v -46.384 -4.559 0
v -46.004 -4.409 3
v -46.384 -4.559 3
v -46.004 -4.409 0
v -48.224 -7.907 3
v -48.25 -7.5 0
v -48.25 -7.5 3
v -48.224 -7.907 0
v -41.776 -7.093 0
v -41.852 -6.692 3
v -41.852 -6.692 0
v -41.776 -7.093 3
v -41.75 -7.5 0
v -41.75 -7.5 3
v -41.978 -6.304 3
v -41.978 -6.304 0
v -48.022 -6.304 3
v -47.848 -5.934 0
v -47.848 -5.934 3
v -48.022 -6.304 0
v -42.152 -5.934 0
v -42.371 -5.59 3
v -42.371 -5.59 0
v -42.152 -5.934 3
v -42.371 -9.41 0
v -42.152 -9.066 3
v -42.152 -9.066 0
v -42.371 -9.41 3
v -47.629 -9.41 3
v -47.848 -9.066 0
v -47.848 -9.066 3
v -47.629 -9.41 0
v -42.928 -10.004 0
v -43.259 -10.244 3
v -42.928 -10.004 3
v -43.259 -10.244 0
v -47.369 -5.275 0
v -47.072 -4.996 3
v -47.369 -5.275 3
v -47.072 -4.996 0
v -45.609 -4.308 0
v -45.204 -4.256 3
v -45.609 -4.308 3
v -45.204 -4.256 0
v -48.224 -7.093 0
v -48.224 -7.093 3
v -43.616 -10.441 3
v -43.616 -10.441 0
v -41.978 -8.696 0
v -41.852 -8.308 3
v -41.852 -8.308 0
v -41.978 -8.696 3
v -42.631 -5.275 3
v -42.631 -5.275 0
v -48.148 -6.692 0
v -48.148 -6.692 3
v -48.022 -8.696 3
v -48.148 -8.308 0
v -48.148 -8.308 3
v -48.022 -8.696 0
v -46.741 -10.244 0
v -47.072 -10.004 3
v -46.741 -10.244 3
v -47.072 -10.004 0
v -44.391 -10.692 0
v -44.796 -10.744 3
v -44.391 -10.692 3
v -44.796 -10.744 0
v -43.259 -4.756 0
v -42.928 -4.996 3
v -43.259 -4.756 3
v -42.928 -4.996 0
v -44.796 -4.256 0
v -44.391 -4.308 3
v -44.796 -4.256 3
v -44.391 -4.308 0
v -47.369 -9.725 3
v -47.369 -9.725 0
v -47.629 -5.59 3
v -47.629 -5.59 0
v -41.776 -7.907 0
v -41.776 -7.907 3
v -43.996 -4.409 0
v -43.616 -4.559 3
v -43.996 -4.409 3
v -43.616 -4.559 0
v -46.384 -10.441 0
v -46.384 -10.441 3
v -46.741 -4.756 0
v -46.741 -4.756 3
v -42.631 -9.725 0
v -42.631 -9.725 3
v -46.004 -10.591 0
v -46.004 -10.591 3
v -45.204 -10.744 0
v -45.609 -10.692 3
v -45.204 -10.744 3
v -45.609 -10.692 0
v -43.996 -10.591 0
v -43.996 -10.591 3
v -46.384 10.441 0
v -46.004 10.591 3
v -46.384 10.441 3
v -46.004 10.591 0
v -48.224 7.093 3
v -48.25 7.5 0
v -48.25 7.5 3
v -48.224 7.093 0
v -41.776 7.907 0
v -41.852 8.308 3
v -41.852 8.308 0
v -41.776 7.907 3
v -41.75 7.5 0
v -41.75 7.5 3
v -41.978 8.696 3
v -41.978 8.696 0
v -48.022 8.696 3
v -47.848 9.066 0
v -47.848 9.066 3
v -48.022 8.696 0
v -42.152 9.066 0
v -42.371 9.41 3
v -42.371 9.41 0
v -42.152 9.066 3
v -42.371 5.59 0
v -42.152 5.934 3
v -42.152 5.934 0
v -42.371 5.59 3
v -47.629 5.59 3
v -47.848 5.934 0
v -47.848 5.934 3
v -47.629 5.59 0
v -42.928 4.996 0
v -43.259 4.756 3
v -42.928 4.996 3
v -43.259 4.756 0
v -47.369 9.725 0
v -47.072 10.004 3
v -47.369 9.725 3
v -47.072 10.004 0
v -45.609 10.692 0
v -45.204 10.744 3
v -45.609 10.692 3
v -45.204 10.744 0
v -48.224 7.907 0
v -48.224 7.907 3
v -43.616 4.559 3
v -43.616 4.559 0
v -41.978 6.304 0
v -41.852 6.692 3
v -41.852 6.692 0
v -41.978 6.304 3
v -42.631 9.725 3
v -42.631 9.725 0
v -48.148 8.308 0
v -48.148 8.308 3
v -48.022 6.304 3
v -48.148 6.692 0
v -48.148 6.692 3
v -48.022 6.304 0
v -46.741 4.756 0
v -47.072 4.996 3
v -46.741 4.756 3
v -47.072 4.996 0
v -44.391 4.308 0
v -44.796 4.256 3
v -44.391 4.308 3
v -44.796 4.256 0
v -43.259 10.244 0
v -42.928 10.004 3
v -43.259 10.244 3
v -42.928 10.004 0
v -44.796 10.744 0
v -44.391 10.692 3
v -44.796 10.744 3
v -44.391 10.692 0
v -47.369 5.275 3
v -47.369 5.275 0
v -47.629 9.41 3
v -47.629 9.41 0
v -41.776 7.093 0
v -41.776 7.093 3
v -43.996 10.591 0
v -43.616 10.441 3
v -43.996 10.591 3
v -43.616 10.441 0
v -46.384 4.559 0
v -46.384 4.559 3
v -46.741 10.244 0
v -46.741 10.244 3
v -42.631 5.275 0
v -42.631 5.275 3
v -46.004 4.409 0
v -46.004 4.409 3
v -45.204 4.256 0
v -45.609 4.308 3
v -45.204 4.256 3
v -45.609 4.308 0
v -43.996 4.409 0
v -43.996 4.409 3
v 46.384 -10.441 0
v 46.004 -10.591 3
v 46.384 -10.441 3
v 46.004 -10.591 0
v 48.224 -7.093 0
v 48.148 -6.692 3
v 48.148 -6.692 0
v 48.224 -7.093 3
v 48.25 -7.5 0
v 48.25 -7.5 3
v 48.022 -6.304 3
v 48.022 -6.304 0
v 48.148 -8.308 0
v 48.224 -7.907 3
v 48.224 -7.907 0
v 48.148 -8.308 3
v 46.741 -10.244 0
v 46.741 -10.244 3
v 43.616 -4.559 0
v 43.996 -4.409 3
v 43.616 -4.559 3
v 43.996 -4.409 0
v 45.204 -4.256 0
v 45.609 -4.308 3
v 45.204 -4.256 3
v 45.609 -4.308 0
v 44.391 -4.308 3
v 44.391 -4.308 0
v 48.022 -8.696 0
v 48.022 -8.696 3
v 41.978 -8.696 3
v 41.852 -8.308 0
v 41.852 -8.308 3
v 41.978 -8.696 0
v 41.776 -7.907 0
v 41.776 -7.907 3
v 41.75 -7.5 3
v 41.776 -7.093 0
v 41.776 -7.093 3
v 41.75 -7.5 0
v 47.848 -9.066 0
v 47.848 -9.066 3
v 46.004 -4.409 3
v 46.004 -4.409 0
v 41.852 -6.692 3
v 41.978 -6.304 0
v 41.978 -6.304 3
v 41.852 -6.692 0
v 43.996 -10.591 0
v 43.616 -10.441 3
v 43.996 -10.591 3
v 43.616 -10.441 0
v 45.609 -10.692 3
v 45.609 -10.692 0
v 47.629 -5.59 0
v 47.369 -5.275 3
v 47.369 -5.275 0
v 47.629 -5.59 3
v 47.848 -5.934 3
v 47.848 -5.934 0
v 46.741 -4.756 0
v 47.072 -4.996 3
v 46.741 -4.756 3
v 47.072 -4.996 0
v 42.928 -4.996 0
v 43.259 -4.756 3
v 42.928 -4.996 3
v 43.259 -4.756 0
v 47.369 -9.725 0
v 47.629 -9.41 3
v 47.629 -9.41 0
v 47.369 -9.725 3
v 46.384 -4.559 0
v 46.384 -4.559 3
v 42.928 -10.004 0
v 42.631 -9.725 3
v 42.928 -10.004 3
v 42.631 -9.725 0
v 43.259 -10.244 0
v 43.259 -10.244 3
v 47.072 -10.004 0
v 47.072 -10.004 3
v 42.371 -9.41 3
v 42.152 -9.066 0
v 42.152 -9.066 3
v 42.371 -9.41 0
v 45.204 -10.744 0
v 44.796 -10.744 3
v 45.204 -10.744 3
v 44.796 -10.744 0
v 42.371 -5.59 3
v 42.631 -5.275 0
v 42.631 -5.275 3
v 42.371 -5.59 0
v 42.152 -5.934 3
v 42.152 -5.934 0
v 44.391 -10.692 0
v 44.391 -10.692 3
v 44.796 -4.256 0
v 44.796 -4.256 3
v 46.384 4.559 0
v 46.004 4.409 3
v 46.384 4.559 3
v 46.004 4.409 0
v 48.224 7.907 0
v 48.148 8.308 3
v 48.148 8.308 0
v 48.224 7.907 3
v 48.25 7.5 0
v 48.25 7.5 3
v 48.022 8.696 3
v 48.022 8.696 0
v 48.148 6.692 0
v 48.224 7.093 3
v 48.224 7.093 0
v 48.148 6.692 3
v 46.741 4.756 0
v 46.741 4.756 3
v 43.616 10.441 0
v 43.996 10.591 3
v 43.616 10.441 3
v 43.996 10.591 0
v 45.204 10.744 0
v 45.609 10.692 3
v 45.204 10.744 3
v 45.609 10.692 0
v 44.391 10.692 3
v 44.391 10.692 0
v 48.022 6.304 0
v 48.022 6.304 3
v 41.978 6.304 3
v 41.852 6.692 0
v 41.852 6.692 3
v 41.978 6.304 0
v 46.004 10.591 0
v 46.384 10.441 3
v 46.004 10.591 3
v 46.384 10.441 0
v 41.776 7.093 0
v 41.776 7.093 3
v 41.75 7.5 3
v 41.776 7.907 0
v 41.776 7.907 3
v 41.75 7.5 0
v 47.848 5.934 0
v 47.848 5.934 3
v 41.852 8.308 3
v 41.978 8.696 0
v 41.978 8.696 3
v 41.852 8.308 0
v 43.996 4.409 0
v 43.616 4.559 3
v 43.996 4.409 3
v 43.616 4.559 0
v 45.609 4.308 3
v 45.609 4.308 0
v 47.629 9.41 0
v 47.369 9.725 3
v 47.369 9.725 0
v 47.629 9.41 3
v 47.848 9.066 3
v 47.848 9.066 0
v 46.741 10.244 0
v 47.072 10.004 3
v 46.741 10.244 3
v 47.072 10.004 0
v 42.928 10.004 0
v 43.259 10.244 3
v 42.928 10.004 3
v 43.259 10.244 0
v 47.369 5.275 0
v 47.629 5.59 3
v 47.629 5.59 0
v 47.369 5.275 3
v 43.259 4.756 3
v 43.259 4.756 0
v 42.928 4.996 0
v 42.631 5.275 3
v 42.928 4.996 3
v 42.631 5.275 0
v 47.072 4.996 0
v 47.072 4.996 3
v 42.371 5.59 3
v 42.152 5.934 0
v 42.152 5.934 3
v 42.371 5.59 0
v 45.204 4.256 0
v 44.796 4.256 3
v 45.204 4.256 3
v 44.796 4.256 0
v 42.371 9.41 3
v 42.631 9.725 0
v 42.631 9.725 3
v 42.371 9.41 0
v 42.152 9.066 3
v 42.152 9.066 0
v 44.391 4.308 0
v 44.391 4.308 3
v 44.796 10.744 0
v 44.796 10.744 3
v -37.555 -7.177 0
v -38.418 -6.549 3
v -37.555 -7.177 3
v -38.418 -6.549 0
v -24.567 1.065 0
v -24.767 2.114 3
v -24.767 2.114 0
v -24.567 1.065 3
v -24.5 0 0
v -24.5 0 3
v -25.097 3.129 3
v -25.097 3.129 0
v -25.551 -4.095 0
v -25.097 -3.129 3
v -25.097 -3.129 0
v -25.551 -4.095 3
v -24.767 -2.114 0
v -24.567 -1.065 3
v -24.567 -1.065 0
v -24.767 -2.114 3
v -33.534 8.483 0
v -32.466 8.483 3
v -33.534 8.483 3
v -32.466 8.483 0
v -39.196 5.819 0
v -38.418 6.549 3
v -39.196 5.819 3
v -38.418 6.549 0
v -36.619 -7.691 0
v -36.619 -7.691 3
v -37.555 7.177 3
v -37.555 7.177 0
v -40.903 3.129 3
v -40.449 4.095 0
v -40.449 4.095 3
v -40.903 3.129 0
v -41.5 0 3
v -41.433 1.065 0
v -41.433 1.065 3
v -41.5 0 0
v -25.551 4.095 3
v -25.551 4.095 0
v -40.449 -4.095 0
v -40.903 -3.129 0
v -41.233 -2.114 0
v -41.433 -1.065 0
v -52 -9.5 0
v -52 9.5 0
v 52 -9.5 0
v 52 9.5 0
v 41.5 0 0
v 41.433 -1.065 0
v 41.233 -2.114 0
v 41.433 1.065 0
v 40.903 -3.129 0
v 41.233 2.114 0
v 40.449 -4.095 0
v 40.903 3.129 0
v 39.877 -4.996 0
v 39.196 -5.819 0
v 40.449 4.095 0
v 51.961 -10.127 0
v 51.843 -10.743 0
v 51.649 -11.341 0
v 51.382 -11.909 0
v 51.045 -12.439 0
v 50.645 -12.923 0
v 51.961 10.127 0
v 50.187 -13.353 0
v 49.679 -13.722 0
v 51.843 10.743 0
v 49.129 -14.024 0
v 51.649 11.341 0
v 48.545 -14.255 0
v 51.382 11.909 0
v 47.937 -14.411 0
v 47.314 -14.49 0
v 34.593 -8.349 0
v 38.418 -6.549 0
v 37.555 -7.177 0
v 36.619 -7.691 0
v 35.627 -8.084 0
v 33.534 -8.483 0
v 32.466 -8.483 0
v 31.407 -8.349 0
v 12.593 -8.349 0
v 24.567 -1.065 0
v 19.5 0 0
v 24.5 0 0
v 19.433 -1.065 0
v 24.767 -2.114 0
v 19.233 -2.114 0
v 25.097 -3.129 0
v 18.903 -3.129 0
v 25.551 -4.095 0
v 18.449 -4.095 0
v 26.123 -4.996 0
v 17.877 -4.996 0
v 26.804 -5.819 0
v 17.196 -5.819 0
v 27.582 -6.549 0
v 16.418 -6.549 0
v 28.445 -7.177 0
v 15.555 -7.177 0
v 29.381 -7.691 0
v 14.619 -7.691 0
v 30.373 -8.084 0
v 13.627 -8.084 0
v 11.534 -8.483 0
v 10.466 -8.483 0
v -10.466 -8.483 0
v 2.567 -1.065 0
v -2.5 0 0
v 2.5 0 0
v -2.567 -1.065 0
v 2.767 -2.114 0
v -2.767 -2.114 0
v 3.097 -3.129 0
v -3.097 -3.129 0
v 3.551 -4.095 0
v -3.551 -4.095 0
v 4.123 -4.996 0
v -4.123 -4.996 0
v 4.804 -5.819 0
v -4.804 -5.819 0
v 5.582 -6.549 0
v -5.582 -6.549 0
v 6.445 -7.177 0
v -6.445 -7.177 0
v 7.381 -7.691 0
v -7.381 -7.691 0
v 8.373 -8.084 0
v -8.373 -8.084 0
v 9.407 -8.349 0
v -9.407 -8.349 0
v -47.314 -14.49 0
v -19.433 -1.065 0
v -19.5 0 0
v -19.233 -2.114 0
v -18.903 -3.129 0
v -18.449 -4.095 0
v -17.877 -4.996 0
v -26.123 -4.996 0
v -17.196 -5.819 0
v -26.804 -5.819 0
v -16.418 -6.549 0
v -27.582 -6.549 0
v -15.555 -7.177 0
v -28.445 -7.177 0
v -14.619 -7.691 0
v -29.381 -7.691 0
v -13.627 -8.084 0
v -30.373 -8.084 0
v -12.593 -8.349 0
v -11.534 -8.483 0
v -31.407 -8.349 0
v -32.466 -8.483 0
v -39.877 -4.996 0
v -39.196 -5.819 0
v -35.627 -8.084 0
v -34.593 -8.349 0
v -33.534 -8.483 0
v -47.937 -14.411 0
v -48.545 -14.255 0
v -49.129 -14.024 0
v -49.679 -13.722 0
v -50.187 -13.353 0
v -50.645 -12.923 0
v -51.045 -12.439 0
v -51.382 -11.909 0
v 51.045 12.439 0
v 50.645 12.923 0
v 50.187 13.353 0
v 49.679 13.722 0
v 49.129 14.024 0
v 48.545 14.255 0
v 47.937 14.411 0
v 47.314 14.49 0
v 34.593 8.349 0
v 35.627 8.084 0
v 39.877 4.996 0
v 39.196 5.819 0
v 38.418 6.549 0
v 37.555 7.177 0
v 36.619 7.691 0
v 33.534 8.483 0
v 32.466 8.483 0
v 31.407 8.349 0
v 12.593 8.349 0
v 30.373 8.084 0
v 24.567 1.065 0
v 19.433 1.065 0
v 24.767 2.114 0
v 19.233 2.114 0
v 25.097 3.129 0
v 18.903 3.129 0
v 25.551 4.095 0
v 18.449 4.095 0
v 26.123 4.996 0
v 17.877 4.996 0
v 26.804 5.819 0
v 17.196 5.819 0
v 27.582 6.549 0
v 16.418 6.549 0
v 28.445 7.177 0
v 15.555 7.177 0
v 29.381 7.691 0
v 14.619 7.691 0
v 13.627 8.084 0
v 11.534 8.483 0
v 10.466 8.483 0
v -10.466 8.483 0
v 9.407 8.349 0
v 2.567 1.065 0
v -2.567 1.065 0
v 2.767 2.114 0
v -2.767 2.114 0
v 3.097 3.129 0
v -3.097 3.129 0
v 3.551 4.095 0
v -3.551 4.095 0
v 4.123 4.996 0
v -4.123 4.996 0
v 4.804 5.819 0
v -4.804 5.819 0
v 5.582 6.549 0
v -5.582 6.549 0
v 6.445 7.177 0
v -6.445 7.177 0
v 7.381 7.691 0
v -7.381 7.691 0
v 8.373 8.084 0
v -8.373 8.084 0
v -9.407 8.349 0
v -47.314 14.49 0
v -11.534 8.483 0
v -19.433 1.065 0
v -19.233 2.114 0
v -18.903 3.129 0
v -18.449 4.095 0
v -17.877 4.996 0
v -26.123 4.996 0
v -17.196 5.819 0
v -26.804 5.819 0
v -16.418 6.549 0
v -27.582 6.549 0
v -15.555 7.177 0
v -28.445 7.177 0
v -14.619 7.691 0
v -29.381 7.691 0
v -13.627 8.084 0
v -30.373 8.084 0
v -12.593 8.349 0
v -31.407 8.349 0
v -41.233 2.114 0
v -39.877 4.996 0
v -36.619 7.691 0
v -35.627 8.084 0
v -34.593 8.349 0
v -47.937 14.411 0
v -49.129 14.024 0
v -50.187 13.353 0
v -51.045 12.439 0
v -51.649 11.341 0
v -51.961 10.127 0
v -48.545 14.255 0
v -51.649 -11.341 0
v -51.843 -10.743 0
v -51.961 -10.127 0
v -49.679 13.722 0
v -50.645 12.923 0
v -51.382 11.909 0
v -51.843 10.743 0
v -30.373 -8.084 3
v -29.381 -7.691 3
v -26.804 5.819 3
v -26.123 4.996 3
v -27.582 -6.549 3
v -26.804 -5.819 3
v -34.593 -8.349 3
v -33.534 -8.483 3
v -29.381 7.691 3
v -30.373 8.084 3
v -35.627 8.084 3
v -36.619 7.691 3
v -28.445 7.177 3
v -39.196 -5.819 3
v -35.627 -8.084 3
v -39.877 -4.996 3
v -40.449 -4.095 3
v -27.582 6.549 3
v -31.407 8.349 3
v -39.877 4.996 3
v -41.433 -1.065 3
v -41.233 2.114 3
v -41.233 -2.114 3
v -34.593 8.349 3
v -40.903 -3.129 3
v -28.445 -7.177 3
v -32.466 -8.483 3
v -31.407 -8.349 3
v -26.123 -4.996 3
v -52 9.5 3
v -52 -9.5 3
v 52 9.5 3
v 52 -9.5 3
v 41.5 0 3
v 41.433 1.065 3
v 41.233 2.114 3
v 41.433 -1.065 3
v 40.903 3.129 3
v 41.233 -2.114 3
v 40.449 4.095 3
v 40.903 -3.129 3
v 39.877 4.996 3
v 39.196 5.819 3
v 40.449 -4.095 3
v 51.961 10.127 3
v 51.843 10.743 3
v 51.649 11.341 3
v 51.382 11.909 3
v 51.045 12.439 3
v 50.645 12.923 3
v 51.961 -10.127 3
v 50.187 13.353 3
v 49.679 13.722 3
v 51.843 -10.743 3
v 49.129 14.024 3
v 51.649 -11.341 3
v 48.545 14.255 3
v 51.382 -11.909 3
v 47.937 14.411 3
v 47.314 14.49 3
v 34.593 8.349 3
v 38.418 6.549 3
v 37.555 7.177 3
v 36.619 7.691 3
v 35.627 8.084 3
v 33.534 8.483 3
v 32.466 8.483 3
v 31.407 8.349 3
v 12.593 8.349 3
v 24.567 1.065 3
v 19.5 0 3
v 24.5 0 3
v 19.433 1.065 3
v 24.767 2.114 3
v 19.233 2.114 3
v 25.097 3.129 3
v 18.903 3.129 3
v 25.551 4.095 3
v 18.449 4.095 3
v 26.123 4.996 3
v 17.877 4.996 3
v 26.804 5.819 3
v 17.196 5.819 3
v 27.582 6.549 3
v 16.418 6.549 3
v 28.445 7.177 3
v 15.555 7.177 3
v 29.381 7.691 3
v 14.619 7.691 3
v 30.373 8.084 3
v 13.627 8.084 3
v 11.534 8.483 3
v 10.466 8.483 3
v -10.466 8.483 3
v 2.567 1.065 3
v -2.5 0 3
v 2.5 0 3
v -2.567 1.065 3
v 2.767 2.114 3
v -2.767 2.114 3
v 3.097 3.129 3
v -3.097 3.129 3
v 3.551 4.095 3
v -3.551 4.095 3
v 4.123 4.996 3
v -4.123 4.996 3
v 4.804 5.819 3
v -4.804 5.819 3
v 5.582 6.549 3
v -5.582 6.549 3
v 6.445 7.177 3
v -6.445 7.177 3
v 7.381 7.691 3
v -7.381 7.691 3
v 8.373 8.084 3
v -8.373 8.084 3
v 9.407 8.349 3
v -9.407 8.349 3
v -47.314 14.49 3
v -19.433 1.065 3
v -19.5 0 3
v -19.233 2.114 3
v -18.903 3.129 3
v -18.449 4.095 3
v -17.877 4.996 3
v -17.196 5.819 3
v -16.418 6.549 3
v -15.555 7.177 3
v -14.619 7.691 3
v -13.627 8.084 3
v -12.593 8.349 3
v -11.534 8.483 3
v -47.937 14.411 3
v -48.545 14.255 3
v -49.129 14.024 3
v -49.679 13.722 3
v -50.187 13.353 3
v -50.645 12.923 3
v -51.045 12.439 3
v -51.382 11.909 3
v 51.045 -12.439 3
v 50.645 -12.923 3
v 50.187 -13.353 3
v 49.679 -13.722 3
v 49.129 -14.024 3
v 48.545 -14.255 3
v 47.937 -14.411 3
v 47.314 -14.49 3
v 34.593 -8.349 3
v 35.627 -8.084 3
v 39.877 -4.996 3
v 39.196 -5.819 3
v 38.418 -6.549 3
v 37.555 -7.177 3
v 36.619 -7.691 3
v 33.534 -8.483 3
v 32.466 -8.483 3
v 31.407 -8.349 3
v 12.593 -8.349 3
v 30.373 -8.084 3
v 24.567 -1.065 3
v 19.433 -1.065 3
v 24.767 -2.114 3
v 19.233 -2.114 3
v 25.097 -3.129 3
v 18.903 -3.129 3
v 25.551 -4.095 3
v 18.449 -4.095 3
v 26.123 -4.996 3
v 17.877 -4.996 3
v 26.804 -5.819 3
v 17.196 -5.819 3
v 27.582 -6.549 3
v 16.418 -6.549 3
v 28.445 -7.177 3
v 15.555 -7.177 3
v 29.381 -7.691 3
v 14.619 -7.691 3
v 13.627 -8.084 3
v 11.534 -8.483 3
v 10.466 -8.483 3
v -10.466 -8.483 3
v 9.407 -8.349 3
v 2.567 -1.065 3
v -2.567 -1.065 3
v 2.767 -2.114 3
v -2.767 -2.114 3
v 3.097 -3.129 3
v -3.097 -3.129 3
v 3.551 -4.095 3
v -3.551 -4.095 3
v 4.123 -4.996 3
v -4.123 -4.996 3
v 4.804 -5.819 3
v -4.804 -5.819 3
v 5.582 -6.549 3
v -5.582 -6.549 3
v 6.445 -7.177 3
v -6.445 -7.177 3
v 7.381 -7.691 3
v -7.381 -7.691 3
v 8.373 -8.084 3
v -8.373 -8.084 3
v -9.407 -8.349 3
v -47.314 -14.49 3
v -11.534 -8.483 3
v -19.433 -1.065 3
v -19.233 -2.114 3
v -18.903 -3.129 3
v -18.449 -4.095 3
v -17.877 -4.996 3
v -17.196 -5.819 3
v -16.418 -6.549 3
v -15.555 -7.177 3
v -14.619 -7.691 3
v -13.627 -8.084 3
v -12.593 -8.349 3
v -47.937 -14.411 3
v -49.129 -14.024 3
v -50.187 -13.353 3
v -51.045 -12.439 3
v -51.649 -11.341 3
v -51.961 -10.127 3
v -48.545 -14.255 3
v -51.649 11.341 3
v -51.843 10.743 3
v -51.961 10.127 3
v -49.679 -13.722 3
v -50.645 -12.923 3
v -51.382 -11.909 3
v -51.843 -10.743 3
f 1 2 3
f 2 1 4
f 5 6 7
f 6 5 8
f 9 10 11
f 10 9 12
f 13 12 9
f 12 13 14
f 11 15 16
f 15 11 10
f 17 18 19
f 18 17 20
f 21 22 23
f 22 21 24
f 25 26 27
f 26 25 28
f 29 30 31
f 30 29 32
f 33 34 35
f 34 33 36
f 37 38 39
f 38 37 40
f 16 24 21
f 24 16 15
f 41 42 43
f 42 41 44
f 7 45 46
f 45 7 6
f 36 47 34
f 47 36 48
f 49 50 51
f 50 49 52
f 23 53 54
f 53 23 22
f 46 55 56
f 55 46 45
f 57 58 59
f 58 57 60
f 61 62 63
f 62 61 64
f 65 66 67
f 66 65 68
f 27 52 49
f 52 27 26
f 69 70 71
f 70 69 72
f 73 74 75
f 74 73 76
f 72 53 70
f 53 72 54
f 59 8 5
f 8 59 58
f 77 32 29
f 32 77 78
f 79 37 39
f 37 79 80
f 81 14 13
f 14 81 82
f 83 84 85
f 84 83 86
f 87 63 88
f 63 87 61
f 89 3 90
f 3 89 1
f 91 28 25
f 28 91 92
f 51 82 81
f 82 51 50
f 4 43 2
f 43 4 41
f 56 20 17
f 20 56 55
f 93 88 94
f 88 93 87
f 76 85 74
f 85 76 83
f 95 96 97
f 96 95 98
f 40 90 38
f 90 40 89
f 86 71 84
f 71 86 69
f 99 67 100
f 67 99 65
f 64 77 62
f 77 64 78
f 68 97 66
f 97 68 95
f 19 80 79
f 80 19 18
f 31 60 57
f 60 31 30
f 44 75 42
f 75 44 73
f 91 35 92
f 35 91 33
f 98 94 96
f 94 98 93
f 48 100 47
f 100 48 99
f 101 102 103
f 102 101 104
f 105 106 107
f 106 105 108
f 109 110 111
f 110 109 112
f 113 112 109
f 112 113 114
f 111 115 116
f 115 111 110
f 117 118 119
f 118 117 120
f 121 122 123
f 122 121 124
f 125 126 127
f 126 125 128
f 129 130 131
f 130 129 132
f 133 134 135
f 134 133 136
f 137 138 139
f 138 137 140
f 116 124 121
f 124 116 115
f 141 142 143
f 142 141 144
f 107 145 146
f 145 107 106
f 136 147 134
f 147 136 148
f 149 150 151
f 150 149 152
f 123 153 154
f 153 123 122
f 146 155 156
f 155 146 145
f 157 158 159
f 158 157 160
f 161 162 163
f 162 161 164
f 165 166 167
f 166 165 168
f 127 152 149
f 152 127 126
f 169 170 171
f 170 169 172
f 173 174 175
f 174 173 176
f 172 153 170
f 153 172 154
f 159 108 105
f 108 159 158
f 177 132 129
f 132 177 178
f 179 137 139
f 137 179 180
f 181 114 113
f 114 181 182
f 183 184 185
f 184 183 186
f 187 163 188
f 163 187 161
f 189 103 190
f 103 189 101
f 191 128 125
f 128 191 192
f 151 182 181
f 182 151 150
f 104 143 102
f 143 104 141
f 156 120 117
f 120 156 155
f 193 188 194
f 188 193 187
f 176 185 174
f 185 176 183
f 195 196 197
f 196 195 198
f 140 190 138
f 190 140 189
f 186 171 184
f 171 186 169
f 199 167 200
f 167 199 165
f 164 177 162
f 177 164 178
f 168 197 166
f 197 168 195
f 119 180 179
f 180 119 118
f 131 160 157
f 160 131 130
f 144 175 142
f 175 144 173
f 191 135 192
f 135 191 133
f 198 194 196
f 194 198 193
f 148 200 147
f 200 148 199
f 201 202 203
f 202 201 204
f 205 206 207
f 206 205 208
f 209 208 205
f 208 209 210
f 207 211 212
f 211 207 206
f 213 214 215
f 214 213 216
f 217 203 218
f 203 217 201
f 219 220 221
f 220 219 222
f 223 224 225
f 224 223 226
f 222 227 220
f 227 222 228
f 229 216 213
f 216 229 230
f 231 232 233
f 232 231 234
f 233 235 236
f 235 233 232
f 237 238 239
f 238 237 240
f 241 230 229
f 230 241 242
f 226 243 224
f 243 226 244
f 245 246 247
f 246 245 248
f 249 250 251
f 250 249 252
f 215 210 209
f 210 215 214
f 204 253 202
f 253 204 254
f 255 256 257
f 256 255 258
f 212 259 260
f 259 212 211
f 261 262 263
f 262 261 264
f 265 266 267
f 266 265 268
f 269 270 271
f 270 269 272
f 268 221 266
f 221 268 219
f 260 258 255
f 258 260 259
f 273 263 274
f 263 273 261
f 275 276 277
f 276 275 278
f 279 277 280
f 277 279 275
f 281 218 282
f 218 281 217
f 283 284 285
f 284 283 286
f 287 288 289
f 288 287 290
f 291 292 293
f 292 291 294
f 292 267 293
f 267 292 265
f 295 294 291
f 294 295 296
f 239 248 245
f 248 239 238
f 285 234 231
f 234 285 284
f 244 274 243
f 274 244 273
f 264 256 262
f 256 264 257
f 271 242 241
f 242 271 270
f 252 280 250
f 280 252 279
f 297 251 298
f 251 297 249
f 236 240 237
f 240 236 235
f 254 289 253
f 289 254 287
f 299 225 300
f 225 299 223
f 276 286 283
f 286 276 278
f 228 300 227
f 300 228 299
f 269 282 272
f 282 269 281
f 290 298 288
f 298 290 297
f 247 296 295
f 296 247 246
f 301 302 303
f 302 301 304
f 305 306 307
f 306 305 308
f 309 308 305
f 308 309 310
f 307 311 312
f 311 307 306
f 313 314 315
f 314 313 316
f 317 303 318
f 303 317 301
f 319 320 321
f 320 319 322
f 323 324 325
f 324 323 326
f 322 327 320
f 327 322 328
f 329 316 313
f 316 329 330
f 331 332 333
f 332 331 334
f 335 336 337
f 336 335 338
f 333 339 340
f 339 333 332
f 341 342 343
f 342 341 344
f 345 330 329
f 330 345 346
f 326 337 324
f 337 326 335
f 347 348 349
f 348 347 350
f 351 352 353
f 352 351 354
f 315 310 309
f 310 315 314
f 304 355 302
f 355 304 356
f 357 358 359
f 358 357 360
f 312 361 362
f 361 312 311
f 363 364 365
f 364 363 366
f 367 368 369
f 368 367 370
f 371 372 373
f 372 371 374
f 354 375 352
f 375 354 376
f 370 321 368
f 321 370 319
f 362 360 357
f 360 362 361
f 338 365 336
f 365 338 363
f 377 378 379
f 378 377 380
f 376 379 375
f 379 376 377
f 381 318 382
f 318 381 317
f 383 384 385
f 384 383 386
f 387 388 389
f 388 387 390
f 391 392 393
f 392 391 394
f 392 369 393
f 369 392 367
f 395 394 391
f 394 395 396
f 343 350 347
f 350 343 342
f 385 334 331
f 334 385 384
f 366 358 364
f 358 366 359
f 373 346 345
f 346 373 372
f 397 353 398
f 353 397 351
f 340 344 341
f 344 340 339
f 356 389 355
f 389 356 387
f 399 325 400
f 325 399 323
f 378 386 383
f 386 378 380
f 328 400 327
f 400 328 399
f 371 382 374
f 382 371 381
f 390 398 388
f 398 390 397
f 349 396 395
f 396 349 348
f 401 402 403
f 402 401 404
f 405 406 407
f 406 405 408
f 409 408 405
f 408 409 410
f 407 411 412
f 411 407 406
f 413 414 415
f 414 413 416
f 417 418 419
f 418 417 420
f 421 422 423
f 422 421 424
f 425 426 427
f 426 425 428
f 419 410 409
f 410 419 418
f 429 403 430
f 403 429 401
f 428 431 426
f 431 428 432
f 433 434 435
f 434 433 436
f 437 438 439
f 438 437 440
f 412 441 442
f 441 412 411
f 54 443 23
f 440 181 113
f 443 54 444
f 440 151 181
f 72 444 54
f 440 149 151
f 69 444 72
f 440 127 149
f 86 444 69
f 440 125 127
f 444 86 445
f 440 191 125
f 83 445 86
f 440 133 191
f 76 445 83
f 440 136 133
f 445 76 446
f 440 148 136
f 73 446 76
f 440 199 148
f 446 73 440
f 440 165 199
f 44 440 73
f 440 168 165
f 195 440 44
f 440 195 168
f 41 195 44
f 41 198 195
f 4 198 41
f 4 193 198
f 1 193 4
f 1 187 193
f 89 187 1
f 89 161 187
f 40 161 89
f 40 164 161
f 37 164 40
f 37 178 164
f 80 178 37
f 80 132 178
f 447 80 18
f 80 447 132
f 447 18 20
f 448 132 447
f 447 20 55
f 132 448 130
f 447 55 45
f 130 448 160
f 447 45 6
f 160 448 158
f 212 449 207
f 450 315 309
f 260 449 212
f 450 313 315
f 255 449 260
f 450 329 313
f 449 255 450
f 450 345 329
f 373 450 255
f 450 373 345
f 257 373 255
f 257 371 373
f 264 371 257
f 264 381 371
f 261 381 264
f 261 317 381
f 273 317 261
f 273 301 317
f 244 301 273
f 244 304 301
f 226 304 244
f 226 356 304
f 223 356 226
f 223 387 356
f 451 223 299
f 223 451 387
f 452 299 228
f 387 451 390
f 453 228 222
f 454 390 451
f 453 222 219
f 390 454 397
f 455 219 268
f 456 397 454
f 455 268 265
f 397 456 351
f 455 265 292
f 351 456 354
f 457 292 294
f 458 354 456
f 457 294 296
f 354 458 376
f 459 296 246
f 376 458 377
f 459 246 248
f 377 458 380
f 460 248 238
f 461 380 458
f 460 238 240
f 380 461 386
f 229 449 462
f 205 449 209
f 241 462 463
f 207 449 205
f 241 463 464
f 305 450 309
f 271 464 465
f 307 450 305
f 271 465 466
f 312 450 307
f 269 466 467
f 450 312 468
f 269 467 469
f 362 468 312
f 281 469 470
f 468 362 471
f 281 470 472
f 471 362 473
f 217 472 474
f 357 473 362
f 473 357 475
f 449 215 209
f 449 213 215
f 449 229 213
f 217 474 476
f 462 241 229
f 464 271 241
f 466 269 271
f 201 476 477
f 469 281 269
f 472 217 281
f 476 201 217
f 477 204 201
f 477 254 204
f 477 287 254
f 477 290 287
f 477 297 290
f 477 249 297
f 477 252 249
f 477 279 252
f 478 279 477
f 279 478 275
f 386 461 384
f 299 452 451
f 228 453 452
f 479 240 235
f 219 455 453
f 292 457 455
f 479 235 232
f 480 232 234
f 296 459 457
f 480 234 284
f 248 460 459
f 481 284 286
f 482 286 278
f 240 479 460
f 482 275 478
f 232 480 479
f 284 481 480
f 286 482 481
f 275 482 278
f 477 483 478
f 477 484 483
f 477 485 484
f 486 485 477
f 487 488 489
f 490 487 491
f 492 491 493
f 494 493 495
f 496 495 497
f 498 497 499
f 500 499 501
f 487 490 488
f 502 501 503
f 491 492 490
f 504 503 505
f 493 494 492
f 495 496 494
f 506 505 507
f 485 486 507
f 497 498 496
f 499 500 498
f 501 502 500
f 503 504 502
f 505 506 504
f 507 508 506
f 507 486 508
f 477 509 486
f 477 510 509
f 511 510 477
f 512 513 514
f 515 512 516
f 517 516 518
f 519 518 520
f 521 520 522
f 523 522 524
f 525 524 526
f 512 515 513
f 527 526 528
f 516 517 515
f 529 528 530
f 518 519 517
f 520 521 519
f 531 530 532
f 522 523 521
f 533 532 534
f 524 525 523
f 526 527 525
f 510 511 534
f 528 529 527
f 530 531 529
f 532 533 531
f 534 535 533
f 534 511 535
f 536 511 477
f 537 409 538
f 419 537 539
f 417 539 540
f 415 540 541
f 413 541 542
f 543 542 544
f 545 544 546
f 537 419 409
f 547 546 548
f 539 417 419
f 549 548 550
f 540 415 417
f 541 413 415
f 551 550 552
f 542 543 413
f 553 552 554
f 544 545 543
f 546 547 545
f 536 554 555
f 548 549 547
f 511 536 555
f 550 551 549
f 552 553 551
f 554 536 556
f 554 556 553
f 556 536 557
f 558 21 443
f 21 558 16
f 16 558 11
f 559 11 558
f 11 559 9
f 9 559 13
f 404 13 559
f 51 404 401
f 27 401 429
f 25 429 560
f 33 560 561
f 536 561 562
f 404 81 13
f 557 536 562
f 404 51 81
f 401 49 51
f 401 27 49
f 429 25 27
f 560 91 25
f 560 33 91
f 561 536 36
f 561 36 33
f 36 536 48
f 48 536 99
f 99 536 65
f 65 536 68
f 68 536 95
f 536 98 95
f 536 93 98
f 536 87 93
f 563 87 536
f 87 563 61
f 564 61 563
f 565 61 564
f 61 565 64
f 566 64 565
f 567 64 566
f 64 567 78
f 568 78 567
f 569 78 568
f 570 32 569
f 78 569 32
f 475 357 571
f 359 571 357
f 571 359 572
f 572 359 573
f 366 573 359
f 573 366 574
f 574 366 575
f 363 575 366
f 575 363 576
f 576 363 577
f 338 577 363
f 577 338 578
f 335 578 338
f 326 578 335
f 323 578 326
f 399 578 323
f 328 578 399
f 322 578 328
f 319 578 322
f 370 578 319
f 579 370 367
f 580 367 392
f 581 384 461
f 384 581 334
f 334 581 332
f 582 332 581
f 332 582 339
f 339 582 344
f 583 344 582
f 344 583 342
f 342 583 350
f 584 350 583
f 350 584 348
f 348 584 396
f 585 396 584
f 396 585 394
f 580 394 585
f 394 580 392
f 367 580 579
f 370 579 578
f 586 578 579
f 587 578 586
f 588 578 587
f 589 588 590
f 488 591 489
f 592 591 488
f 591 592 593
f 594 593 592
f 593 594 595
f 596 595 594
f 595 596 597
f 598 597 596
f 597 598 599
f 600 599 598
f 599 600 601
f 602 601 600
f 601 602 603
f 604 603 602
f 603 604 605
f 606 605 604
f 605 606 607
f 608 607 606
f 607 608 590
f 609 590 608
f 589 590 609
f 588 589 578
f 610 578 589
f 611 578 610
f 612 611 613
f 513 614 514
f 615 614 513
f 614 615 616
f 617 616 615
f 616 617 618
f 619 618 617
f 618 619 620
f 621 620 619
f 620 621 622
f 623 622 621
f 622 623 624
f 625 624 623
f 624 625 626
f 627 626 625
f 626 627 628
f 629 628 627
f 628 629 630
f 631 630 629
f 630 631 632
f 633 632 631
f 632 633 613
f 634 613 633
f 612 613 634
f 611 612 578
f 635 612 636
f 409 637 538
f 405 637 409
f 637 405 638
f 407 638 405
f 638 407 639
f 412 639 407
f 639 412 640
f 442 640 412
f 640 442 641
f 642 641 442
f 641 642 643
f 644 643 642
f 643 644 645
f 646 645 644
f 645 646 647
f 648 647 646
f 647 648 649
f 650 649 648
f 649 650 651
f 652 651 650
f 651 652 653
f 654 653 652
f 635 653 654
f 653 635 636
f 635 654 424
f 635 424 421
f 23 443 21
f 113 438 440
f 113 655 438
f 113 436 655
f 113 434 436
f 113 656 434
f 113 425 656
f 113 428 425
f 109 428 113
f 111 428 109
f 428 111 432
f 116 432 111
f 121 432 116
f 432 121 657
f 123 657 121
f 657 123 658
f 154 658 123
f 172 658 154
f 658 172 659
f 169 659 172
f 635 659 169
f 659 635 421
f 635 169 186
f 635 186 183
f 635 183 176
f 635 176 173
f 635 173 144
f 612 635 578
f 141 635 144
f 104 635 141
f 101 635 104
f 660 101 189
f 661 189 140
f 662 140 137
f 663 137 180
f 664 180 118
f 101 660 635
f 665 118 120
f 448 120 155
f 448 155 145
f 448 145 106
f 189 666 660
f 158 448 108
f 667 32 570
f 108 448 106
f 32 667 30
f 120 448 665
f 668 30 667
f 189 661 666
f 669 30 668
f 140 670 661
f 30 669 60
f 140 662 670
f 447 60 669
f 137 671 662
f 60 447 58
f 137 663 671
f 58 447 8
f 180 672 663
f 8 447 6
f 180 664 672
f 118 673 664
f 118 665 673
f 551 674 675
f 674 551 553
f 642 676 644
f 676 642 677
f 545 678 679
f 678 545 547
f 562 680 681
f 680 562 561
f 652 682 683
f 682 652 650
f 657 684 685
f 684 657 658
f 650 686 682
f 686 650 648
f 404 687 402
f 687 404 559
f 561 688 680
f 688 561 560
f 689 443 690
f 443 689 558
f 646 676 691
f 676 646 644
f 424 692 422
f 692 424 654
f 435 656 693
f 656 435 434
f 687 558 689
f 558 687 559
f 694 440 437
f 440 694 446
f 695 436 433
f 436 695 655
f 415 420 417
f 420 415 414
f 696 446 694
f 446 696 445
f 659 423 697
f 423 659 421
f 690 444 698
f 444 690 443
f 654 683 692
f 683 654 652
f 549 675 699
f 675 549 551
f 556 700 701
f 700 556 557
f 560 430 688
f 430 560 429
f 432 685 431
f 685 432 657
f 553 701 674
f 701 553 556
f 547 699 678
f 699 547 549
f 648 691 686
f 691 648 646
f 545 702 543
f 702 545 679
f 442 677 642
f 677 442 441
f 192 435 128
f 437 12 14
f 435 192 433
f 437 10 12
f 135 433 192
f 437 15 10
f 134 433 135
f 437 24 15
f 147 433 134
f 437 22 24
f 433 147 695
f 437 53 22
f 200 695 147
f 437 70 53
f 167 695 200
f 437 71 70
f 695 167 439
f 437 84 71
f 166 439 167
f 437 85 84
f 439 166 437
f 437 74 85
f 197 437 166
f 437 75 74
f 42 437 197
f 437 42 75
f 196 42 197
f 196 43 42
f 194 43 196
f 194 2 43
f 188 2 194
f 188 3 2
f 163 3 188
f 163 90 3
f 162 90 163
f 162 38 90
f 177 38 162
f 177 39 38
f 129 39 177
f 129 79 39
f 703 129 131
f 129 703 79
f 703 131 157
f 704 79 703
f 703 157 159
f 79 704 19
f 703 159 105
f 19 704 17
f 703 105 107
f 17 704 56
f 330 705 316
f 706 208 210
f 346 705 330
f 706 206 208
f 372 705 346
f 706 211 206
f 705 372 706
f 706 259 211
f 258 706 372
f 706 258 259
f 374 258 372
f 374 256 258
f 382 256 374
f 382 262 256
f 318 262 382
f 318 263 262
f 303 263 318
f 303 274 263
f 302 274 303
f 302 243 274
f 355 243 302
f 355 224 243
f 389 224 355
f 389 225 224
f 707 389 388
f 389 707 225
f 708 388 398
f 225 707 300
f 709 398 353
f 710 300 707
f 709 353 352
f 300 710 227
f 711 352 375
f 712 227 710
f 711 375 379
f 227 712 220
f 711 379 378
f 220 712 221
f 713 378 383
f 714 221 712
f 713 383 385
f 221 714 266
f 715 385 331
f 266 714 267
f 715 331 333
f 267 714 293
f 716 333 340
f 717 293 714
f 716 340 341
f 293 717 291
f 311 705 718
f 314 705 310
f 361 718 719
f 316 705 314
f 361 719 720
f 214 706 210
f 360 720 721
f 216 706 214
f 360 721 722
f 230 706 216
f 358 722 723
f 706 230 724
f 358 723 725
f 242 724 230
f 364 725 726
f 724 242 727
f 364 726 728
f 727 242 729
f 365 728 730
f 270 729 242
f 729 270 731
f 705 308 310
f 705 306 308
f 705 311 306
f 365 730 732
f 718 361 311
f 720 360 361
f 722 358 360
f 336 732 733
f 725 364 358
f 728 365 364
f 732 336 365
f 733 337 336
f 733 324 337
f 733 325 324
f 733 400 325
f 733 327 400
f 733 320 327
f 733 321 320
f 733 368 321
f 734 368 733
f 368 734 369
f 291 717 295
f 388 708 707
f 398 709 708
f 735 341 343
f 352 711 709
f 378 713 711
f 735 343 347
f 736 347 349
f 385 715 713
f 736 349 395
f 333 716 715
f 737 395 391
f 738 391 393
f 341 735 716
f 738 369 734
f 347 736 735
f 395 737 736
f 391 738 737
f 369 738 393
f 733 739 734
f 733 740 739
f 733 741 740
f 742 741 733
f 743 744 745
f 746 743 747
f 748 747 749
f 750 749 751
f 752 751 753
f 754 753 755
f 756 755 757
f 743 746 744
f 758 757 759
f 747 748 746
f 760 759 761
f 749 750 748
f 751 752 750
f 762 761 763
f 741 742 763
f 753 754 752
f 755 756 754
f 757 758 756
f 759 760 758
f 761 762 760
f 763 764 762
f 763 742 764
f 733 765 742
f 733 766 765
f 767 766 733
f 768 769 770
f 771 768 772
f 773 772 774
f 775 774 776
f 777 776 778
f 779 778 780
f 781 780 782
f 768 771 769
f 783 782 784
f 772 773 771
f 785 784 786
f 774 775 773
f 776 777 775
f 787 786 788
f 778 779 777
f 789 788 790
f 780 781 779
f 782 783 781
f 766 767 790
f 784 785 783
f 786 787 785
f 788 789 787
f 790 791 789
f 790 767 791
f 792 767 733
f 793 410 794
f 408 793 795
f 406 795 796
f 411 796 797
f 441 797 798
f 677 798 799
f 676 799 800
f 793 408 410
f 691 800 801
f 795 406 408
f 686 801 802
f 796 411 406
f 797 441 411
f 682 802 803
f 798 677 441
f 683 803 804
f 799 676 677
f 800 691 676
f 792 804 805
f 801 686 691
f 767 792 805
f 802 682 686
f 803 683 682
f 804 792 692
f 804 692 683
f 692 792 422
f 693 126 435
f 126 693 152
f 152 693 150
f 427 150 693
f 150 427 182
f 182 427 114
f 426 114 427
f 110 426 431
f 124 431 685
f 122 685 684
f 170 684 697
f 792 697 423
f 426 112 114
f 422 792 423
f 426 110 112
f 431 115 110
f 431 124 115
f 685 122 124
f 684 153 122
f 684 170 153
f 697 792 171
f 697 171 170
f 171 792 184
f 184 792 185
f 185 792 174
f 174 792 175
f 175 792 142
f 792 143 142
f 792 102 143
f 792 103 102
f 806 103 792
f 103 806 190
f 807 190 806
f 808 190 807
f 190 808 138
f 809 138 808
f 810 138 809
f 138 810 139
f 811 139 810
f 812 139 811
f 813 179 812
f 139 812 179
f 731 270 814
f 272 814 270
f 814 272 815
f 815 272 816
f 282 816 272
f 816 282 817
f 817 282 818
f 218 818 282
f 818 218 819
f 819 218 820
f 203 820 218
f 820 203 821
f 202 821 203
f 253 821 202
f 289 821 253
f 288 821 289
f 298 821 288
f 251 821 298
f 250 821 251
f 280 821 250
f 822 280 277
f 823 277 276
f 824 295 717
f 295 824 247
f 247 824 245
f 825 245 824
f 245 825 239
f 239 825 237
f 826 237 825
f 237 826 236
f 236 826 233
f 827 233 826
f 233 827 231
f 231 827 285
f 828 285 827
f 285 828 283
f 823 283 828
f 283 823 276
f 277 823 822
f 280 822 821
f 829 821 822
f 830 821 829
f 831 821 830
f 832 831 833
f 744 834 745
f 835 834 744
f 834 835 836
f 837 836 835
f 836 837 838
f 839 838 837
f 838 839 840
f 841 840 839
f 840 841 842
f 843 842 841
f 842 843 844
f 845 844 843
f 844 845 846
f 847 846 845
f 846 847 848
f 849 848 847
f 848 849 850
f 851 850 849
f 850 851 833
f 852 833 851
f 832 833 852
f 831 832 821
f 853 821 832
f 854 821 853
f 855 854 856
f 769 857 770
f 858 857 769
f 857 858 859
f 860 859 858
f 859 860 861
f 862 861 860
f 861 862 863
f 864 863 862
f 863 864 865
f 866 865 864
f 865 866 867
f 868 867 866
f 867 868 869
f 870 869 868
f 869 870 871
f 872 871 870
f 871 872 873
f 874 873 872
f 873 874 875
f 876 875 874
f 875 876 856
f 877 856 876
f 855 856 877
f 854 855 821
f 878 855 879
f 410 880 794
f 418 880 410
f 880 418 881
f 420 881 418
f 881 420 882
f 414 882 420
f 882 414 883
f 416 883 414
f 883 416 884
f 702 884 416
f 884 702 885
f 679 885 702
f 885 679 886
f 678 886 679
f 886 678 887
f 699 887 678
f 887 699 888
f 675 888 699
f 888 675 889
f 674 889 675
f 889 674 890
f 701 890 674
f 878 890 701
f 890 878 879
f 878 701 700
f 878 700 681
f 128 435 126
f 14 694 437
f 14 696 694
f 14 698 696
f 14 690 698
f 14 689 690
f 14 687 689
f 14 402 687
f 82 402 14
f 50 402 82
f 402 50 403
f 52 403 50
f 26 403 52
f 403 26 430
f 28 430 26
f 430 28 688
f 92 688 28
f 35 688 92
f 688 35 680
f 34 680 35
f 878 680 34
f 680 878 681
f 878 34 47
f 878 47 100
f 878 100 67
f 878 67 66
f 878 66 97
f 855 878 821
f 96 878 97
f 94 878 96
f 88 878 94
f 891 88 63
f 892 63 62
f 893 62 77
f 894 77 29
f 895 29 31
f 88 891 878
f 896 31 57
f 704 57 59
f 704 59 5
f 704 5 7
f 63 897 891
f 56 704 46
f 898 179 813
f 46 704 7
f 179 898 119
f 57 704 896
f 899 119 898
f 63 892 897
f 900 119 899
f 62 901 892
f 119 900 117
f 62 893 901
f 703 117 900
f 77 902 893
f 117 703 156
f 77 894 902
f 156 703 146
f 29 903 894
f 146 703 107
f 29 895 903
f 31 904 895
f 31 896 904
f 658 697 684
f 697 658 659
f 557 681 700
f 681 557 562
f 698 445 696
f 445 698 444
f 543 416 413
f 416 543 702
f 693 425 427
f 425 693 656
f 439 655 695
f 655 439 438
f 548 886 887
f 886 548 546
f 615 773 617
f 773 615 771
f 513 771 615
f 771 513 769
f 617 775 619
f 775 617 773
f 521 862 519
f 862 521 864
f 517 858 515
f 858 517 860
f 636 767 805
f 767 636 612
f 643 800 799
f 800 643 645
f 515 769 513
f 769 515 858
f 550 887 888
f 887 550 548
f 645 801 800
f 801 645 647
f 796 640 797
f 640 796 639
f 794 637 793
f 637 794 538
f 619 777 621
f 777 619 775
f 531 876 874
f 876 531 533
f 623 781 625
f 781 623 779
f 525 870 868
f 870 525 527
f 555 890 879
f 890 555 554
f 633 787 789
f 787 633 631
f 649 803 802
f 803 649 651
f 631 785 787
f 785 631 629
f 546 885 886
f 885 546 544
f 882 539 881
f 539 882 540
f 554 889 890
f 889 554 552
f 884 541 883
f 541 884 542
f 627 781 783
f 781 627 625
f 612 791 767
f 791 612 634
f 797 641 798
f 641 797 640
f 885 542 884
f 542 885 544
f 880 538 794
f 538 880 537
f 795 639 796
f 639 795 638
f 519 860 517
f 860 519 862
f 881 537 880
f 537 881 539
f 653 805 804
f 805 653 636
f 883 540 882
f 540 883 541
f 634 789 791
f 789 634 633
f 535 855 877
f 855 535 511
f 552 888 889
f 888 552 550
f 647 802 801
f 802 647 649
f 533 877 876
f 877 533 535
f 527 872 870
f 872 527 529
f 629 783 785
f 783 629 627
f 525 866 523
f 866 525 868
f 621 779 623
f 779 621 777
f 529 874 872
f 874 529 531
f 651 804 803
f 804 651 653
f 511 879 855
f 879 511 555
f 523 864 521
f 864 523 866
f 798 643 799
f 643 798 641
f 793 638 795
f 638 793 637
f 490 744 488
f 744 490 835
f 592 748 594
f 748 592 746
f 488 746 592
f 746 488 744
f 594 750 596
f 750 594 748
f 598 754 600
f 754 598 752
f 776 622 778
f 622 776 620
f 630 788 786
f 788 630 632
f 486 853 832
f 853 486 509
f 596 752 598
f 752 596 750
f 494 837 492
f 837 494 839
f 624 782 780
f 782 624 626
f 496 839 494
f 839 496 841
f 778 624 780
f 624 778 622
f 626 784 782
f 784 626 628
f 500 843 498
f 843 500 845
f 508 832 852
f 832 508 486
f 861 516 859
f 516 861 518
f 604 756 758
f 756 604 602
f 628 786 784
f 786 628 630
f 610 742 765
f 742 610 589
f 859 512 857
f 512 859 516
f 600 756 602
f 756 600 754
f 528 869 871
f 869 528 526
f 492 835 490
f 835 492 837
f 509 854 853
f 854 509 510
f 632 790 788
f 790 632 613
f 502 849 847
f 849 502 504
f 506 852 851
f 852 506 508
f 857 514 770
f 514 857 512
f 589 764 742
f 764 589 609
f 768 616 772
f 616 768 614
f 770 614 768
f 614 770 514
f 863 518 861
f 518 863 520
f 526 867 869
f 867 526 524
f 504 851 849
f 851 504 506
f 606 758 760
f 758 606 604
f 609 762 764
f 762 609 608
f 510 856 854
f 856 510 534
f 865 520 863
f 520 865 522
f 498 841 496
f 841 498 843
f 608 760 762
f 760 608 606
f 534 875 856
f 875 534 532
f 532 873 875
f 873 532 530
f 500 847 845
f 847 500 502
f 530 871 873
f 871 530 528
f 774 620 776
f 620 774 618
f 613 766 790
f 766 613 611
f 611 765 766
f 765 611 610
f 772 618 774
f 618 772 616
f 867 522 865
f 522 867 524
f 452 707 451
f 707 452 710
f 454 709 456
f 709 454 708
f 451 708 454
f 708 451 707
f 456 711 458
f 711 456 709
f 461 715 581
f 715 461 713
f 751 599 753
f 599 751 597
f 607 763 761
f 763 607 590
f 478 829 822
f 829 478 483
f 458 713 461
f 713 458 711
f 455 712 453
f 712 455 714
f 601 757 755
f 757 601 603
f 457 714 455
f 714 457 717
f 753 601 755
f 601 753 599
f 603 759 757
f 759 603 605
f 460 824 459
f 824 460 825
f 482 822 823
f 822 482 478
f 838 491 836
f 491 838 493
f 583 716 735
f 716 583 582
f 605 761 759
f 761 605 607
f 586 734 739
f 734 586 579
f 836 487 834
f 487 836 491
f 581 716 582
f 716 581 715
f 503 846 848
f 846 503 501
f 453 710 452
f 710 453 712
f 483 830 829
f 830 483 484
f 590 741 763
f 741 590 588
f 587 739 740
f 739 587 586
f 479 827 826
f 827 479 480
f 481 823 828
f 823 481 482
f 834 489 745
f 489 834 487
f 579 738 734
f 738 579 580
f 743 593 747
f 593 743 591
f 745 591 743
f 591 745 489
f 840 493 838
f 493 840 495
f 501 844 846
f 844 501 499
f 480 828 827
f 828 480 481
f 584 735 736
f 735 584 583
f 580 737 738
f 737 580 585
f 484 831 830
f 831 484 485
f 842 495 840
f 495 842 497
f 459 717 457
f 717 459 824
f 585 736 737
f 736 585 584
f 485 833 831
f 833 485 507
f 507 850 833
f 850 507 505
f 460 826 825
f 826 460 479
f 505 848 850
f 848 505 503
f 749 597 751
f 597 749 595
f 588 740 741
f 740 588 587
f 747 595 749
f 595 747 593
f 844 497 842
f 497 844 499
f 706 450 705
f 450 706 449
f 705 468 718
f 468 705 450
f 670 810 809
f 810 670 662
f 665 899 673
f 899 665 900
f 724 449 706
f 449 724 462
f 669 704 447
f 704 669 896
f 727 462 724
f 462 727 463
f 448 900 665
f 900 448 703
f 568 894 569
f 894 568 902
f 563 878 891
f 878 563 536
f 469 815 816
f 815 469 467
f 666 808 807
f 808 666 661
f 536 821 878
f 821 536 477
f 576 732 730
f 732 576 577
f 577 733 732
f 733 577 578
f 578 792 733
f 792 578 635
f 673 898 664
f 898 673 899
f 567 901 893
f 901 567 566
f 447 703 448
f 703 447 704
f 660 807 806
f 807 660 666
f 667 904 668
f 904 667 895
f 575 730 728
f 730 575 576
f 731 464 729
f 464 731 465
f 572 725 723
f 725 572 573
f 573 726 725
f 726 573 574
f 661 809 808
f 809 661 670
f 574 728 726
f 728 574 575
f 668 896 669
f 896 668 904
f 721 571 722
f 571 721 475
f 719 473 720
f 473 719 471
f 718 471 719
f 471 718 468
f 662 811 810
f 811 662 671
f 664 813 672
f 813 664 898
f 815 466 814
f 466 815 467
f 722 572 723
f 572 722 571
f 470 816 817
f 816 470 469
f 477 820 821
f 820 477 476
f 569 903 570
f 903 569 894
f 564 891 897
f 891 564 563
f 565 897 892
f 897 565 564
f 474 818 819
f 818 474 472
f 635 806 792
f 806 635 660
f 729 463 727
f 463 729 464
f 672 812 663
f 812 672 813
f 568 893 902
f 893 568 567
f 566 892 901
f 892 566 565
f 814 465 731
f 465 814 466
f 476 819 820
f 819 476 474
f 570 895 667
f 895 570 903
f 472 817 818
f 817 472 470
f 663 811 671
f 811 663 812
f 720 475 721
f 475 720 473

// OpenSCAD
$fn = 50;


difference() {
	union() {
		hull() {
			translate(v = [-47.0000000000, 9.5000000000, 0]) {
				cylinder(h = 3, r = 5);
			}
			translate(v = [47.0000000000, 9.5000000000, 0]) {
				cylinder(h = 3, r = 5);
			}
			translate(v = [-47.0000000000, -9.5000000000, 0]) {
				cylinder(h = 3, r = 5);
			}
			translate(v = [47.0000000000, -9.5000000000, 0]) {
				cylinder(h = 3, r = 5);
			}
		}
	}
	union() {
		#translate(v = [-45.0000000000, -7.5000000000, -100.0000000000]) {
			cylinder(h = 200, r = 3.2500000000);
		}
		#translate(v = [-45.0000000000, 7.5000000000, -100.0000000000]) {
			cylinder(h = 200, r = 3.2500000000);
		}
		#translate(v = [45.0000000000, -7.5000000000, -100.0000000000]) {
			cylinder(h = 200, r = 3.2500000000);
		}
		#translate(v = [45.0000000000, 7.5000000000, -100.0000000000]) {
			cylinder(h = 200, r = 3.2500000000);
		}
		#translate(v = [-33.0000000000, 0, 0]) {
			cylinder(h = 3, r = 8.5000000000);
		}
		#translate(v = [-11.0000000000, 0, 0]) {
			cylinder(h = 3, r = 8.5000000000);
		}
		#translate(v = [11.0000000000, 0, 0]) {
			cylinder(h = 3, r = 8.5000000000);
		}
		#translate(v = [33.0000000000, 0, 0]) {
			cylinder(h = 3, r = 8.5000000000);
		}
	}
}
